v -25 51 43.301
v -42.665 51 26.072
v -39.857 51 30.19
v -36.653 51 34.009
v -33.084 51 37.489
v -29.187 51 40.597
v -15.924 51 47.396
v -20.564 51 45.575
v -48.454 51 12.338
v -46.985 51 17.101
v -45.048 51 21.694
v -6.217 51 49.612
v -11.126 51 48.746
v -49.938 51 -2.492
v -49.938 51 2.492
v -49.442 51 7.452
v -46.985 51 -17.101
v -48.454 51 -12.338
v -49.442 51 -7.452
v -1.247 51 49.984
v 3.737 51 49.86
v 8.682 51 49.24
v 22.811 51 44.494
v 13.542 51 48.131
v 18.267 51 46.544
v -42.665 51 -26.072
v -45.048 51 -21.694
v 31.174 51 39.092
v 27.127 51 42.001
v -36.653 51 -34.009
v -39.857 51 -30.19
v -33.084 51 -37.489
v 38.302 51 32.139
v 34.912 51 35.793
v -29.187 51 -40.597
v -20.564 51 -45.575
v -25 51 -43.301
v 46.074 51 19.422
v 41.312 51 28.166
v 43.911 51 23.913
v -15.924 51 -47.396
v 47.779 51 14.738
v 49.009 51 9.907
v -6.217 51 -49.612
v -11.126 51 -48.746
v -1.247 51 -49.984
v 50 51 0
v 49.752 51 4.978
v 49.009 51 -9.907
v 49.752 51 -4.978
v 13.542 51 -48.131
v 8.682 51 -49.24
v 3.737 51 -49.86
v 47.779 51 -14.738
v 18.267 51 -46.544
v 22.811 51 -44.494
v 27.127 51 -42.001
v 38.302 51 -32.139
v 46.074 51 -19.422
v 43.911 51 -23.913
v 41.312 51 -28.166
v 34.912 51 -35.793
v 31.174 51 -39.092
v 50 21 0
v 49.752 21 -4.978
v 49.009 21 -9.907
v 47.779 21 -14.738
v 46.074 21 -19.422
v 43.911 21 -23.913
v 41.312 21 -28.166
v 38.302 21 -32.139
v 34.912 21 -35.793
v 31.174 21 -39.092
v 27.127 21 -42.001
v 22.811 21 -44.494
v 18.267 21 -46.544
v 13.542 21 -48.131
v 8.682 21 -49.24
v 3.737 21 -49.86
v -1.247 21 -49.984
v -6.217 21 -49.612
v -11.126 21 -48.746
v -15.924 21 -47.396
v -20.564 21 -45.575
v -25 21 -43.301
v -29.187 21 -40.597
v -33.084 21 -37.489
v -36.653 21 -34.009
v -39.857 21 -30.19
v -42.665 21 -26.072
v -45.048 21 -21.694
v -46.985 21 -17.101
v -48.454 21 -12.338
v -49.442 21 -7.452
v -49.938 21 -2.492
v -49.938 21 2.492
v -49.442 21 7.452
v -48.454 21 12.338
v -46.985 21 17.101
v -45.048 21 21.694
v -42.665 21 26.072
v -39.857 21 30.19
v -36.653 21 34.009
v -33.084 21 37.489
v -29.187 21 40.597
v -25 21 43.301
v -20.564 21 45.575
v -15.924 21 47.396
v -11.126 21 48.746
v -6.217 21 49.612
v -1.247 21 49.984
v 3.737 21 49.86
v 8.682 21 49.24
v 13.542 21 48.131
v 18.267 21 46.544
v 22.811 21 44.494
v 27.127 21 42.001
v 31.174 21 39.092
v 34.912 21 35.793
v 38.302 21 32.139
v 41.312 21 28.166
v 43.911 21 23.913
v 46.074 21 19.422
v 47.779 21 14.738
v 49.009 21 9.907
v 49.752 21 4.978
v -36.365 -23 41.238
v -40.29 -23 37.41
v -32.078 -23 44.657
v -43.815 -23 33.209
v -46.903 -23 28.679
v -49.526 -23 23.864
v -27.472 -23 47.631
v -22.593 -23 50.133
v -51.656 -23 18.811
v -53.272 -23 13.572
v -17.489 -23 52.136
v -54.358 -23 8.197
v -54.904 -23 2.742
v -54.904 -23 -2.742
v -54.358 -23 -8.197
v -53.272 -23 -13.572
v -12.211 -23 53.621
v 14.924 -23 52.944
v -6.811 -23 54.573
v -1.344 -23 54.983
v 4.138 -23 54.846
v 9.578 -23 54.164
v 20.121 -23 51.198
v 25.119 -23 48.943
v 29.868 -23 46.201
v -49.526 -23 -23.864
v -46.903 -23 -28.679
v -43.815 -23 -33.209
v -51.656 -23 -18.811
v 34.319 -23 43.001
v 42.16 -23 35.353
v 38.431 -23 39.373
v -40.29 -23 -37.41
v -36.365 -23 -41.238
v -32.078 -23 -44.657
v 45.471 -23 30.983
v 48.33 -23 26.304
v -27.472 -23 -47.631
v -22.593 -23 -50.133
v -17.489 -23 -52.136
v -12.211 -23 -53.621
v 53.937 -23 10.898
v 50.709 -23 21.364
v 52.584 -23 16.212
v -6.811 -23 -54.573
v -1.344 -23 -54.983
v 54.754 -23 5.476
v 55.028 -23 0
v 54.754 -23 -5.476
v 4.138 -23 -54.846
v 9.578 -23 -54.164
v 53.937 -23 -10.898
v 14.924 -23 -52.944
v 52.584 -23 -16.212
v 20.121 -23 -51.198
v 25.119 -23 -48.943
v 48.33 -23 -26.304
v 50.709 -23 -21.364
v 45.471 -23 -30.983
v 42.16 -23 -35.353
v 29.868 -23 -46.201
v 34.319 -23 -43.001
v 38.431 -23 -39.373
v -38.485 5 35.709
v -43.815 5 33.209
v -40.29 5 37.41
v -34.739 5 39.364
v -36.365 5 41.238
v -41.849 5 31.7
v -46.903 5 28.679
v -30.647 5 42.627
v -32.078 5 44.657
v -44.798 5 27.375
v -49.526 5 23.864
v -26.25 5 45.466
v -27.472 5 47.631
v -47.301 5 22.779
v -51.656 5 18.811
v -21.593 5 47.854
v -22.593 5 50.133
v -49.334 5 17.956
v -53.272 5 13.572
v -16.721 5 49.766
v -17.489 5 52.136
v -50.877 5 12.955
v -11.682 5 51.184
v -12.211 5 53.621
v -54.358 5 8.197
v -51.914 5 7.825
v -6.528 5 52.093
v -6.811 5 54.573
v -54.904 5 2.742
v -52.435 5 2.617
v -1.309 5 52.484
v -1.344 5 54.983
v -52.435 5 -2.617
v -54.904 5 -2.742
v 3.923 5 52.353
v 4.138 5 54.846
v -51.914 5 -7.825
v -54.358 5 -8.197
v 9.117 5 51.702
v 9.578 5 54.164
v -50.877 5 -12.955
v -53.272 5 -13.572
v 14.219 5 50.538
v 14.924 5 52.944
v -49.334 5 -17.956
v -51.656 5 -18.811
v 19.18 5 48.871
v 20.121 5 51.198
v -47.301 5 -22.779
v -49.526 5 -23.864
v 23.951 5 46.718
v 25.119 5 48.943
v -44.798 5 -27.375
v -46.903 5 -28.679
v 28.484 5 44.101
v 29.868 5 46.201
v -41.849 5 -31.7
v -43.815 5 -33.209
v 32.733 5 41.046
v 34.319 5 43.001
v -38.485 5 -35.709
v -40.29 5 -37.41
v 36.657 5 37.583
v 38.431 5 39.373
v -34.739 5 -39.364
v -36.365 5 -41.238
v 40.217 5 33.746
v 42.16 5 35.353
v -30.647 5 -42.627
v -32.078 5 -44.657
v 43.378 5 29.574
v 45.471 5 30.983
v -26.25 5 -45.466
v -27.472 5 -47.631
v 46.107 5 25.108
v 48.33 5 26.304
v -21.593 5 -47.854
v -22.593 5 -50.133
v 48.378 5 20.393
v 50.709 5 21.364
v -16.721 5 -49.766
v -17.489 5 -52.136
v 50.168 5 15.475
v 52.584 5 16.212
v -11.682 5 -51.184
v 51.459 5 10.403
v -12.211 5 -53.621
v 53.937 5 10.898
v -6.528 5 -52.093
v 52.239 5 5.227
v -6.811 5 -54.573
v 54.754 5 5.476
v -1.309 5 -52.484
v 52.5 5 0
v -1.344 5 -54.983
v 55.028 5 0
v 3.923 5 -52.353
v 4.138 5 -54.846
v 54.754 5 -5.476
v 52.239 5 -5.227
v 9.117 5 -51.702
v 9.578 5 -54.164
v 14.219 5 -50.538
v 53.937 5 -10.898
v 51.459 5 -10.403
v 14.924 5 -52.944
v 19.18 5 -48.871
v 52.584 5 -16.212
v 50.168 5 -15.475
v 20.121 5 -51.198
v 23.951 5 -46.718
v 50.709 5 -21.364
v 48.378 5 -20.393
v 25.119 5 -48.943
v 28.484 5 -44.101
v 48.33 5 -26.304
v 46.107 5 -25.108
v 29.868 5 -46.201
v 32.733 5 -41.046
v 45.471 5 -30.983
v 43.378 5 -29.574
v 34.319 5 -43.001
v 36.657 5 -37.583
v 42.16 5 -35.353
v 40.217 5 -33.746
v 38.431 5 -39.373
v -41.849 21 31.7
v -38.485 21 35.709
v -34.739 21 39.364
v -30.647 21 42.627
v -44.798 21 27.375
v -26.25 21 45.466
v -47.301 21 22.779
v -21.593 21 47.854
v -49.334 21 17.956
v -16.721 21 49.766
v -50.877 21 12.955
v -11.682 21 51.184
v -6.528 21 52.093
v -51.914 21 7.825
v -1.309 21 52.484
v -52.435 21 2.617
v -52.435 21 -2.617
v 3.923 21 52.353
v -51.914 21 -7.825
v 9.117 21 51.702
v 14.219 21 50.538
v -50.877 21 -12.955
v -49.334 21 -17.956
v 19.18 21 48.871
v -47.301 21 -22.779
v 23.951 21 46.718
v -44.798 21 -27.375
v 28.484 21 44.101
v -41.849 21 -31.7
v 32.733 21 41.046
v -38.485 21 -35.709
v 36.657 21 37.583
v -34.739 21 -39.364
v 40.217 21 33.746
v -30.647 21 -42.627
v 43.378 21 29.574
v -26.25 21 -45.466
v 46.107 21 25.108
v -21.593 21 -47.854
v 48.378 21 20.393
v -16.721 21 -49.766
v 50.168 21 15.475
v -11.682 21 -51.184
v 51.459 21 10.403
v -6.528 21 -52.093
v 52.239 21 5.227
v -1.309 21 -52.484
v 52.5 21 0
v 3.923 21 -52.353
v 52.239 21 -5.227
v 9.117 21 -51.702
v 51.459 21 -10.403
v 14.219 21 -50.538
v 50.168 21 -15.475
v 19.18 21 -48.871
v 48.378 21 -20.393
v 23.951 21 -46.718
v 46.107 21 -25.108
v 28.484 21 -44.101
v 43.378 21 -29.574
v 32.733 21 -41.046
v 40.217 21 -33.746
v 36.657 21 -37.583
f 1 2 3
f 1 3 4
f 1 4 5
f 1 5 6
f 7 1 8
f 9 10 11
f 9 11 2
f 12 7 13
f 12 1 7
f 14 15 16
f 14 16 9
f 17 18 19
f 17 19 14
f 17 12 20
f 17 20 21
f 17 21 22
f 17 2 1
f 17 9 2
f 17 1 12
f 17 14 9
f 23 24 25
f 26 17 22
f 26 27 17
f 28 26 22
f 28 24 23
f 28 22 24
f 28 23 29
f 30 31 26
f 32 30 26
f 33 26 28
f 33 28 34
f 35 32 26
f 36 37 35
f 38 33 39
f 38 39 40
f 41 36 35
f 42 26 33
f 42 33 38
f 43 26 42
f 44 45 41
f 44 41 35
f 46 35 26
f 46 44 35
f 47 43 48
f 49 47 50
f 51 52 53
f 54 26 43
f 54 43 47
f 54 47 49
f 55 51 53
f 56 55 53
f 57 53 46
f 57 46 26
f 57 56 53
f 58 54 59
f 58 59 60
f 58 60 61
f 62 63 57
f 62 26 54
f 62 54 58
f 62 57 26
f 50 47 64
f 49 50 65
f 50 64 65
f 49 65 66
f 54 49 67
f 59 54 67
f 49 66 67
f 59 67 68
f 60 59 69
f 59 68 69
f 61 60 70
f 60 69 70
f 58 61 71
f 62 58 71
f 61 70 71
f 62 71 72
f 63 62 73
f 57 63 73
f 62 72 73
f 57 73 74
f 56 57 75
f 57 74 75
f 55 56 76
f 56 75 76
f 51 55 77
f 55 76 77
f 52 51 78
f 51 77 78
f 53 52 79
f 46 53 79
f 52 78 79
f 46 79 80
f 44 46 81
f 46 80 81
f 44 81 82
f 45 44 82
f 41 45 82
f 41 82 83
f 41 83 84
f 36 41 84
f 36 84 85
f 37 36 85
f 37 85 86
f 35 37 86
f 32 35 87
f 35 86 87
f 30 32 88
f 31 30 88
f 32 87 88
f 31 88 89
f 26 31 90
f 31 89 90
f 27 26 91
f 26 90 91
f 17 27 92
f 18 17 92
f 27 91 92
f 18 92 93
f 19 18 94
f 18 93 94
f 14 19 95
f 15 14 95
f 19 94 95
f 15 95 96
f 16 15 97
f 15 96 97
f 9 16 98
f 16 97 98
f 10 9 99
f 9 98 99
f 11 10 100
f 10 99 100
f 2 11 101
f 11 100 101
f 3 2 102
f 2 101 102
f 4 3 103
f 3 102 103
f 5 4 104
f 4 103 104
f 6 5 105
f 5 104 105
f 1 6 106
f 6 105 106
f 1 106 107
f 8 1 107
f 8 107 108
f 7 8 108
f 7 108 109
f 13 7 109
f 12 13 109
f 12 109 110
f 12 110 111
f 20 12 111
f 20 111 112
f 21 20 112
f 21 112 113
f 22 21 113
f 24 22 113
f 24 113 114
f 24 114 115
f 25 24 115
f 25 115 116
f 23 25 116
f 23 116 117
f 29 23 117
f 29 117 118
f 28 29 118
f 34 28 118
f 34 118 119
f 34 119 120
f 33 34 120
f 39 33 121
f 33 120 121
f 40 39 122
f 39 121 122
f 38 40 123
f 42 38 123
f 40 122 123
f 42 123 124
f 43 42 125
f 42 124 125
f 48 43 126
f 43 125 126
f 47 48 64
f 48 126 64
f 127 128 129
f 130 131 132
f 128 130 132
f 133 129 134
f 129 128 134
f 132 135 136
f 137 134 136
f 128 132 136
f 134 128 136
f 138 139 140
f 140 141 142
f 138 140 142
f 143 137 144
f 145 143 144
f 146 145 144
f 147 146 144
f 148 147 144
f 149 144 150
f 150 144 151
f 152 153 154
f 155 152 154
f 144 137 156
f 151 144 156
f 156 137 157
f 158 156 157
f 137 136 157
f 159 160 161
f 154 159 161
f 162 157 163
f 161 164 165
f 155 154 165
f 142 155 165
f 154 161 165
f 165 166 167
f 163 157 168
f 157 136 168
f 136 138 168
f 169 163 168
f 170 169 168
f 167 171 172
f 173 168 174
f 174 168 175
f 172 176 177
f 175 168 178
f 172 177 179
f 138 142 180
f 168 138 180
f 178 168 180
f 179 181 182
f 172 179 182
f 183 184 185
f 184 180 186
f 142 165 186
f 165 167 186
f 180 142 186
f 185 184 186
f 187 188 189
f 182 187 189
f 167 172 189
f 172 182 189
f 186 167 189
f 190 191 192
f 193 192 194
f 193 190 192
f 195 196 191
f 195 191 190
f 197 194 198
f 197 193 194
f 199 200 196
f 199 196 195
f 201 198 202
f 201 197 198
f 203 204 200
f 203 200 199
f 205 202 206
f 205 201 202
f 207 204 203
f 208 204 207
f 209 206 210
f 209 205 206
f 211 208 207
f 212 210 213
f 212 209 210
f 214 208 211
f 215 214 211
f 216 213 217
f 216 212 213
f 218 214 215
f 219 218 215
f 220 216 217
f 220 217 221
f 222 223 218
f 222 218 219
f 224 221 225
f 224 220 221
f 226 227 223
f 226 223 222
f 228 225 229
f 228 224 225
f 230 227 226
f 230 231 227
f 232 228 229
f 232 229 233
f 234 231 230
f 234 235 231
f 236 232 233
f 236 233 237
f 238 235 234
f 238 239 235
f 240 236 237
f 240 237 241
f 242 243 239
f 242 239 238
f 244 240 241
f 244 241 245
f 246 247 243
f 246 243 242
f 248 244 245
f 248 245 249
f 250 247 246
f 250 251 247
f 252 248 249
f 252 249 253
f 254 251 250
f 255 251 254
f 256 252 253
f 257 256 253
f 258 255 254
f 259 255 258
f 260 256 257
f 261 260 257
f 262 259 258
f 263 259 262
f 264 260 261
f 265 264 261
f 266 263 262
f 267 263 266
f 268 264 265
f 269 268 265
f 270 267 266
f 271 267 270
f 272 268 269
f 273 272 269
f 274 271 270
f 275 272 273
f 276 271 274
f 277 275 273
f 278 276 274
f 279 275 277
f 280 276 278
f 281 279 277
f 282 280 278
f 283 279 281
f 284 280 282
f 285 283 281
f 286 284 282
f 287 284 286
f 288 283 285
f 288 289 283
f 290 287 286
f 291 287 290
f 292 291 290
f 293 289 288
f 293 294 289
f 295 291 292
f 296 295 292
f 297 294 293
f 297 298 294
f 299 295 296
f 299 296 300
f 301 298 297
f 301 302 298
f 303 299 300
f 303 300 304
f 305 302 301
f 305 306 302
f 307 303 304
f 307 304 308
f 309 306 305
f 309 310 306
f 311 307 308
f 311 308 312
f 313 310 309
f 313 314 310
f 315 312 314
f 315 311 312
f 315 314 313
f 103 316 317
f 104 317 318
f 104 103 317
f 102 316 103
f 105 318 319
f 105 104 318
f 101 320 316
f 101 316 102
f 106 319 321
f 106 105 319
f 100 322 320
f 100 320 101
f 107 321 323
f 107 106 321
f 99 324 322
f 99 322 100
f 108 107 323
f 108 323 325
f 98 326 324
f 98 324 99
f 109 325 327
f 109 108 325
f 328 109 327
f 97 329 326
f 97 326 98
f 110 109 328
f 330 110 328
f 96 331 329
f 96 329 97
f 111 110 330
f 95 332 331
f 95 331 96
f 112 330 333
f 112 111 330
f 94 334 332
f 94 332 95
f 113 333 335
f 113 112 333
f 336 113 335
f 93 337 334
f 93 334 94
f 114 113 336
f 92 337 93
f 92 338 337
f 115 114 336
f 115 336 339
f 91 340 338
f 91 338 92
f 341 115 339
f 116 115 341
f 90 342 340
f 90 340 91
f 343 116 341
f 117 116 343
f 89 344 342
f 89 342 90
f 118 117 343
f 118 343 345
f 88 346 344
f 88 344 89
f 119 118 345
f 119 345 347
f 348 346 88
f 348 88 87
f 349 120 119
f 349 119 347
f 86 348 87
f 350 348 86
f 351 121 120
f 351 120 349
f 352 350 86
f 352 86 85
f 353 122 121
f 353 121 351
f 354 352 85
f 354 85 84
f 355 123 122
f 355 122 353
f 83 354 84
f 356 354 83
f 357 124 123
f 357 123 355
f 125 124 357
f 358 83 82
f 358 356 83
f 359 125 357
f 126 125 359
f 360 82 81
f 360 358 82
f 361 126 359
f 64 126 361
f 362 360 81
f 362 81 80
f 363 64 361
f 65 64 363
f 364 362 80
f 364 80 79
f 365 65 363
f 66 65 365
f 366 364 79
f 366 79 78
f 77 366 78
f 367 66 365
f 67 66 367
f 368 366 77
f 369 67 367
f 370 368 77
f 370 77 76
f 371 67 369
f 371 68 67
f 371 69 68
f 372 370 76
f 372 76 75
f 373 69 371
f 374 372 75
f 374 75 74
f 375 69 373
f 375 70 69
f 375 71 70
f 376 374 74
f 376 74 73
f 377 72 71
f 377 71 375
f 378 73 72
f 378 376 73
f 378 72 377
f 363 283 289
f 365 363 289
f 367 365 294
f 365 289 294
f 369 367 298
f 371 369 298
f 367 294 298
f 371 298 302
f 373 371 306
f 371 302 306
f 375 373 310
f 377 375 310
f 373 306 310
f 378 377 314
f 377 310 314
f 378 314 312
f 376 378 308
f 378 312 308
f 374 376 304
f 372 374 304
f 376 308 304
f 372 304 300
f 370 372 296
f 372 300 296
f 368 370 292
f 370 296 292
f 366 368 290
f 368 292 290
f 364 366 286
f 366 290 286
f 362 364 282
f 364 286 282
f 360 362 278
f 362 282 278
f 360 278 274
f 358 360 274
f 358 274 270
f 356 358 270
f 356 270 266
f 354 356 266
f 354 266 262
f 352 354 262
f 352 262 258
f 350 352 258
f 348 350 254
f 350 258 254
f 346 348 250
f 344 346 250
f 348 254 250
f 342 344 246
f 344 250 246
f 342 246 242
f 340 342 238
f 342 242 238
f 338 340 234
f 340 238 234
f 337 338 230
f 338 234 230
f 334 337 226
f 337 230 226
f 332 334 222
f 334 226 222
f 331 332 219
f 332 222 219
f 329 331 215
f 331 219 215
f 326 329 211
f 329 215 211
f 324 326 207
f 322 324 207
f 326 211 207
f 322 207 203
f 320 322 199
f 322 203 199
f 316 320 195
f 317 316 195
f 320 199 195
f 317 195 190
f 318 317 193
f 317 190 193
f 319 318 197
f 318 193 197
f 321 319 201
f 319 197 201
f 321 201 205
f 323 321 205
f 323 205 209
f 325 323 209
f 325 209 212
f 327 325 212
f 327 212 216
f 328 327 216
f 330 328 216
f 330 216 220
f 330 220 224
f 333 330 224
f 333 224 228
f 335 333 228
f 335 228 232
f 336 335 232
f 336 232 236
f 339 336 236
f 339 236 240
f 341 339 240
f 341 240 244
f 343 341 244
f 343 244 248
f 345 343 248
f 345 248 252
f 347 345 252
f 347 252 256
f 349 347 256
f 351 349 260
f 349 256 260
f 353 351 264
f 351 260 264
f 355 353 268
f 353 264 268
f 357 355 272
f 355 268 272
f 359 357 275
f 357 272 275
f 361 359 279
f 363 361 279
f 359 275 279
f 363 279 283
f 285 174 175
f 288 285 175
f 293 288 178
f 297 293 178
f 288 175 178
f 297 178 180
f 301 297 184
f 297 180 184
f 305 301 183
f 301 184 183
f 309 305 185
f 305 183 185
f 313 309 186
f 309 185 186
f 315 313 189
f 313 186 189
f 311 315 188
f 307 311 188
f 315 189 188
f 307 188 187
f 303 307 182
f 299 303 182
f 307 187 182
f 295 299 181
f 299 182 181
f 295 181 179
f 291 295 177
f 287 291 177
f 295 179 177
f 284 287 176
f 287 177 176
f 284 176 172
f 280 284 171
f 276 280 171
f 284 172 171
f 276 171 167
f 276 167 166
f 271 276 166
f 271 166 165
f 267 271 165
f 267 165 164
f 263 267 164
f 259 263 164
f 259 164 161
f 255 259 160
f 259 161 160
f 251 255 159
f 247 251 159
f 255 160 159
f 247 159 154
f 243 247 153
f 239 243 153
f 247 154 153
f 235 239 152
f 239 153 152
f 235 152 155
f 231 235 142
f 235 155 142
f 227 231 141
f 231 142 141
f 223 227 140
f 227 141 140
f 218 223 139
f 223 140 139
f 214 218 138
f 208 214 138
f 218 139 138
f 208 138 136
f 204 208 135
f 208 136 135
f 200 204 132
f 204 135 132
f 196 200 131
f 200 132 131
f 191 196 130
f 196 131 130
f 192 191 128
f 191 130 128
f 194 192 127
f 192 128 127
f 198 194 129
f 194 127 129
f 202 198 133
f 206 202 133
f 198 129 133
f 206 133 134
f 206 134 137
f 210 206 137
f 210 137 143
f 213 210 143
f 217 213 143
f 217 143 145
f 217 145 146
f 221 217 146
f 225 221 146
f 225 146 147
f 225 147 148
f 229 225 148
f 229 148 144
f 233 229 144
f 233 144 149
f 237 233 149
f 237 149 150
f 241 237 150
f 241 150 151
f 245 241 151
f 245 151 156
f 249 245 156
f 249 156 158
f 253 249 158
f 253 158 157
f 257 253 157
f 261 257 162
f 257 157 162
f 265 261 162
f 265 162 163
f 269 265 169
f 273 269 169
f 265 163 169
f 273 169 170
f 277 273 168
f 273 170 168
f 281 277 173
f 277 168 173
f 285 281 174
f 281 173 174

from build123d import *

# Parameters (mm, degrees)
SKETCH_R             = 55
PAD_DEPTH            = 28
SKETCH001_R          = 52.5
PAD001_DEPTH         = 16
SKETCH012_R          = 50
PAD005_DEPTH         = 30
BODY_PLACEMENT_ANGLE = 90


with BuildPart() as part:
    # Sketch → Pad (new body)
    with BuildSketch(Plane.XY):
        with Locations((0.027552, 0)):
            Circle(SKETCH_R)
    extrude(amount=PAD_DEPTH)

    # Sketch001 (on Face3 of Pad) → Pad001 (join)
    with BuildSketch(Plane.XY.offset(28)):
        Circle(SKETCH001_R)
    extrude(amount=PAD001_DEPTH)

    # Sketch012 (on Face5 of Pad001) → Pad005 (join)
    with BuildSketch(Plane.XY.offset(44)):
        Circle(SKETCH012_R)
    extrude(amount=PAD005_DEPTH)


with BuildPart() as part_1:
    # Body placement: moved
    add(part.part.moved(Location((0, -23, 0))).rotate(Axis((0, -23, 0), (-1, 0, 0)), BODY_PLACEMENT_ANGLE))


solid = part_1.part
